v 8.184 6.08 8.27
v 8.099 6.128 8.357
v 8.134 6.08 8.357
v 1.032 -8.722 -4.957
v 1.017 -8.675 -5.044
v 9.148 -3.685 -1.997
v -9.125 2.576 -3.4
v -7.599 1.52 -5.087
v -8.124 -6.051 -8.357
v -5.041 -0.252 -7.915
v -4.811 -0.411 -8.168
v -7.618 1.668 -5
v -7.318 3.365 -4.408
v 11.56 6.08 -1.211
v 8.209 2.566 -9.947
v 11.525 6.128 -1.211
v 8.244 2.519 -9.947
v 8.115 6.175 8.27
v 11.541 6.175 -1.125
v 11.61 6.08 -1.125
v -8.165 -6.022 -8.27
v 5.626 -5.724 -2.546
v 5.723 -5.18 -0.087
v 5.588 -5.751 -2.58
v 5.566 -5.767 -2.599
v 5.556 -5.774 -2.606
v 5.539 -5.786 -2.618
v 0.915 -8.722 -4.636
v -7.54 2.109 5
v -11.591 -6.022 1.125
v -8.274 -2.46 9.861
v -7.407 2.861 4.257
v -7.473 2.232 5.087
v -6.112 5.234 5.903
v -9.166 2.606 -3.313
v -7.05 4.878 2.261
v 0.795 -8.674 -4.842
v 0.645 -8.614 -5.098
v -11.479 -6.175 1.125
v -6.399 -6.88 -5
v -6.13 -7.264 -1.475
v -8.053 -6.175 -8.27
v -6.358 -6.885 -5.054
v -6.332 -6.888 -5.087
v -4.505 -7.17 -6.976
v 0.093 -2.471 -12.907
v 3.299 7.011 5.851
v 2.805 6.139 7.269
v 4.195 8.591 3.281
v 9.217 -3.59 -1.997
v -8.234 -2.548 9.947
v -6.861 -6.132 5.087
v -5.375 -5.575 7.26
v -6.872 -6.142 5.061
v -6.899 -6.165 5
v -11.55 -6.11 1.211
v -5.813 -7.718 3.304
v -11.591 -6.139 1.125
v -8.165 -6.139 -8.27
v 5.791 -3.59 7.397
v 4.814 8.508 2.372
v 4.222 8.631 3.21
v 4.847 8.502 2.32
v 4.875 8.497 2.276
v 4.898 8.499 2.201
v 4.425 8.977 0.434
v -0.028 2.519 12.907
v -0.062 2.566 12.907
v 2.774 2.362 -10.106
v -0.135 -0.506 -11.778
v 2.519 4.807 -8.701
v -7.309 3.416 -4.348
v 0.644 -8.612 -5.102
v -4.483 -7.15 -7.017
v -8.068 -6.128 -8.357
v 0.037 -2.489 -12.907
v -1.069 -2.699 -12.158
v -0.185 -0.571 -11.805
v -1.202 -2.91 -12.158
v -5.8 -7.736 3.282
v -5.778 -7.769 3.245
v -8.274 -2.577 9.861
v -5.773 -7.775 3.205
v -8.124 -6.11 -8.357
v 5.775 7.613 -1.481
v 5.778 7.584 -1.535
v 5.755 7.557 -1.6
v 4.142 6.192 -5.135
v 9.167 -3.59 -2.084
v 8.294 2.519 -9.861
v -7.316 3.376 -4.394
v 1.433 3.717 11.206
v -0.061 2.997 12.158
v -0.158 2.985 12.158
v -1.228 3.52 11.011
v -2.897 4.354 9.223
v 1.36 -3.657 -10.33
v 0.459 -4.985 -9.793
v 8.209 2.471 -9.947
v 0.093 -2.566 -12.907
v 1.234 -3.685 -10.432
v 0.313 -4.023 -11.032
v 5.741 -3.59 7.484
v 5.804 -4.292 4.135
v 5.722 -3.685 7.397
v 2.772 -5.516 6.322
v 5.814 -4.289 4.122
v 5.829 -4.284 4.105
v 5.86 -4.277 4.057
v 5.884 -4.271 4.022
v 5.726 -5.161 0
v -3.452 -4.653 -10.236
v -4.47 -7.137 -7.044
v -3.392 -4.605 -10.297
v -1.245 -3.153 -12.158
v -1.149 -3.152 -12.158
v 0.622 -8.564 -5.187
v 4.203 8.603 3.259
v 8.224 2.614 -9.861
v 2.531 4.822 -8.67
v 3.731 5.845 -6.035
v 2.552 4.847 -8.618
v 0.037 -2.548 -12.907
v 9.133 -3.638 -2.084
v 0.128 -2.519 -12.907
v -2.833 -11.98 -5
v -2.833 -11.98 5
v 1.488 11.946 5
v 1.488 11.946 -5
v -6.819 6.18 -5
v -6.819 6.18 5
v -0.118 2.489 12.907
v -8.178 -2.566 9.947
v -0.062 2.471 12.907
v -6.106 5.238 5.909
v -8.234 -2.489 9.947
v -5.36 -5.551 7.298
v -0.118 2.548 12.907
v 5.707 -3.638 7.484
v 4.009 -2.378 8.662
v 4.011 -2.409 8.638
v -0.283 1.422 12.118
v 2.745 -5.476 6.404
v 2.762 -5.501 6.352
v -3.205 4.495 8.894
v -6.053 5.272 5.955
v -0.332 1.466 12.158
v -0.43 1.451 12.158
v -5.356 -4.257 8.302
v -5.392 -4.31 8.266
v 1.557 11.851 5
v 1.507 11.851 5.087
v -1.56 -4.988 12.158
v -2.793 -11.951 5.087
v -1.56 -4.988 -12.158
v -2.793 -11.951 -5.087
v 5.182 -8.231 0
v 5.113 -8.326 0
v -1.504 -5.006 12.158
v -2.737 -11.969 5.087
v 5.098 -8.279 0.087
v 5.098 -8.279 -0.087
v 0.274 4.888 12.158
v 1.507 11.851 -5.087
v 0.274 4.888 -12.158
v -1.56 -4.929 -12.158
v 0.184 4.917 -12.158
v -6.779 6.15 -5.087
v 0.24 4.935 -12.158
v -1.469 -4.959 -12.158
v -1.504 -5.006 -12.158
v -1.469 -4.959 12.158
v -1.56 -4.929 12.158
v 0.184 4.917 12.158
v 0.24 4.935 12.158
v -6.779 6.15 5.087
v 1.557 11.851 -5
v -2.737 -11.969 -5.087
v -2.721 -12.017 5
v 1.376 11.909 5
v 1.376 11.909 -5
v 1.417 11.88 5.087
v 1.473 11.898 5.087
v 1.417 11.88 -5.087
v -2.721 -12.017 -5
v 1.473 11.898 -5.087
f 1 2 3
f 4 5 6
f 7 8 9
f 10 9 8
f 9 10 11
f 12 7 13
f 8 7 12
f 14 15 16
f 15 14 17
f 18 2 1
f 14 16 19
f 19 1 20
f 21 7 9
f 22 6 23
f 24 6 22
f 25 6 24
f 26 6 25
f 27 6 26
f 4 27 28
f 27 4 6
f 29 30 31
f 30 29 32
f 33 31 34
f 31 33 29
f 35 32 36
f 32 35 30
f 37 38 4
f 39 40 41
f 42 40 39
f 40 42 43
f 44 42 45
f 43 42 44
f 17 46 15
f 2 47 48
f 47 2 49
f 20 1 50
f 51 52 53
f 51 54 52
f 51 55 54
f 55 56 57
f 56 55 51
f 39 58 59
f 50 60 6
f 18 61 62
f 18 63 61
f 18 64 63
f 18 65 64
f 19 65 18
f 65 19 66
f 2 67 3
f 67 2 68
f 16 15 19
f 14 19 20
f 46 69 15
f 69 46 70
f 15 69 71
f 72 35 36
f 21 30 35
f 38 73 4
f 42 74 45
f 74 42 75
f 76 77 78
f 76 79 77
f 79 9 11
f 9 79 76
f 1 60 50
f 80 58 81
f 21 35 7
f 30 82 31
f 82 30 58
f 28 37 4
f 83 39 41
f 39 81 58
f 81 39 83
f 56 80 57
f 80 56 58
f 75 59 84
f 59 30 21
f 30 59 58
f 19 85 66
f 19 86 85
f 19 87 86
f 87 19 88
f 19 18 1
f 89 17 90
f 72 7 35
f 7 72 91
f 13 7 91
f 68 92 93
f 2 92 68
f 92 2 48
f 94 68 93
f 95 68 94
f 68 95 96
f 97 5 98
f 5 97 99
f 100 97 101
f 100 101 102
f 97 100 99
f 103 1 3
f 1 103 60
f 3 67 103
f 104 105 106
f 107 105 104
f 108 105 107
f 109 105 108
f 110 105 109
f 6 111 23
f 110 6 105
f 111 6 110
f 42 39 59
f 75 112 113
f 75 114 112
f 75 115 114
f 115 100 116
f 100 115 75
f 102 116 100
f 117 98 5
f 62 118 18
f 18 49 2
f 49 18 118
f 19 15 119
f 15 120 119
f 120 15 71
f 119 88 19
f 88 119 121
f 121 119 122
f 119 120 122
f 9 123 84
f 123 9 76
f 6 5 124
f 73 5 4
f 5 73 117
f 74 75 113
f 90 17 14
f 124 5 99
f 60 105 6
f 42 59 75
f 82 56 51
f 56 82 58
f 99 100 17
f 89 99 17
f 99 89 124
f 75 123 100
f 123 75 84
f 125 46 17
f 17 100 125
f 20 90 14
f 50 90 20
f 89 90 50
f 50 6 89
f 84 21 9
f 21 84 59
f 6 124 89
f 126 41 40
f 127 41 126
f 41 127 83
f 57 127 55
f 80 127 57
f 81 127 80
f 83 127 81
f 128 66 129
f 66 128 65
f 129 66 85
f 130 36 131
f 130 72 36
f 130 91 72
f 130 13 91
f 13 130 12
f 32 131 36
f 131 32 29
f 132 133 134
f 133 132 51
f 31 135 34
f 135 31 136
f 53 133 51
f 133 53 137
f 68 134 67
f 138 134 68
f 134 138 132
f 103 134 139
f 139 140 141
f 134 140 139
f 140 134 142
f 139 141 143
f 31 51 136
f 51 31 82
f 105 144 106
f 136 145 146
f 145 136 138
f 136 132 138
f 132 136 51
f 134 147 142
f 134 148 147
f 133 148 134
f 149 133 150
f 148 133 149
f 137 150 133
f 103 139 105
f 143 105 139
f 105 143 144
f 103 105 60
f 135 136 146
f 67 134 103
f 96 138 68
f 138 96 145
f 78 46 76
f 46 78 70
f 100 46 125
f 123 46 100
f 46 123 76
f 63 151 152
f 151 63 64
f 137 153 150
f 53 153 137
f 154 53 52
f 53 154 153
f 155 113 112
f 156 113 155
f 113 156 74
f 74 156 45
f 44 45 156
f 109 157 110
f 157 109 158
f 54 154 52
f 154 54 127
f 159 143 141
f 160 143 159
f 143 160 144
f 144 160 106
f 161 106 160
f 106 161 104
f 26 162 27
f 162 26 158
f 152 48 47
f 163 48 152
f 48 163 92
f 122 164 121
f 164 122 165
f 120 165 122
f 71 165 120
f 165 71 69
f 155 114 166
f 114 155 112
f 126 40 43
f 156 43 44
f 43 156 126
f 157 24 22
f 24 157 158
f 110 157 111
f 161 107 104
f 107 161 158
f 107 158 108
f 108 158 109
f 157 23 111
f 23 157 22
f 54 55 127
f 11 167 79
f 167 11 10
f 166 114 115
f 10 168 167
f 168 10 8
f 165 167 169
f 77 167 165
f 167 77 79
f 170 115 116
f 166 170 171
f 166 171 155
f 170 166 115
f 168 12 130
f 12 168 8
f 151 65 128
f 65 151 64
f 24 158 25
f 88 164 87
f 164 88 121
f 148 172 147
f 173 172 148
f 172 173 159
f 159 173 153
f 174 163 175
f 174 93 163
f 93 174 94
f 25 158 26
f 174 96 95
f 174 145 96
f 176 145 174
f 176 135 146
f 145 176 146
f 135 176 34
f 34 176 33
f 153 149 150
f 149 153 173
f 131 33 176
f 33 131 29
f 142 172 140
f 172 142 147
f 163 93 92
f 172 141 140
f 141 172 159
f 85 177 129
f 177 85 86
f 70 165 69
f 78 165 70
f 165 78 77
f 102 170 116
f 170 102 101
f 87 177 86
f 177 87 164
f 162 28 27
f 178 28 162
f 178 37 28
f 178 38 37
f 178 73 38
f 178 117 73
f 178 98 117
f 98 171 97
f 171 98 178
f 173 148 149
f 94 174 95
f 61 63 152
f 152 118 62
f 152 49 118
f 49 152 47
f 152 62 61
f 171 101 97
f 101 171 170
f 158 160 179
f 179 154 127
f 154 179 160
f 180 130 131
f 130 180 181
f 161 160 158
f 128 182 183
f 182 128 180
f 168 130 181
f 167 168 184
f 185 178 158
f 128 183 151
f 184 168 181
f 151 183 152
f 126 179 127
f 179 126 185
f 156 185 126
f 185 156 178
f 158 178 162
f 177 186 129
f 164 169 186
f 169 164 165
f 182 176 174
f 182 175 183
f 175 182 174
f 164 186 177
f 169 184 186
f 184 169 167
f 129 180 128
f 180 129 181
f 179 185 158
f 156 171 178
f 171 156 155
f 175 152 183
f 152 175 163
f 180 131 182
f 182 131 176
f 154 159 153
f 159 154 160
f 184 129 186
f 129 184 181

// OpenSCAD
// Auto-generated OpenSCAD file

    inner_points = 10*[[-0.1519325222677969, -0.49588870782043115, 1.2071067811865481], [-0.2752191363280171, -1.1921648102349602, 0.5000000000000018], [0.14570769345513235, 1.185070501785053, -0.5000000000000018], [0.02242107939491221, 0.4887943993705236, -1.2071067811865481], [0.02242107939513263, 0.4887943993704884, 1.2071067811865466], [-0.2752191363281084, -1.1921648102349456, -0.499999999999998], [0.14570769345522366, 1.1850705017850383, 0.499999999999998], [-0.15193252226801734, -0.49588870782039596, -1.2071067811865466], [-0.848208624682401, -0.37260209376026526, 0.5000000000000662], [-0.6738550230195627, 0.612081013430669, -0.4999999999999354], [-0.6738550230194714, 0.6120810134306545, 0.5000000000000646], [-0.8482086246824923, -0.3726020937602507, -0.49999999999993383], [0.6315203809781617, -0.12683376828511966, 0.7071067811864822], [0.5082337669179414, -0.8231098706996488, -6.428191312579656e-14], [0.7548069950382528, 0.56944233412943, -6.644684802381562e-14], [0.6315203809780325, -0.1268337682850991, -0.7071067811866129]];

    outer_points = 10*[[-0.007761474101058263, 0.2518537970485801, 1.282035961125326], [-0.8193543823962504, -0.2518537970485801, 0.9860704042545944], [0.8193543823962504, 0.2518537970485801, -0.9860704042545944], [0.007761474101058263, -0.2518537970485801, -1.282035961125326], [0.8083780004585261, 0.608028852569843, 0.8270022394188679], [-1.1509806058735501, -0.608028852569843, 0.11247817802624172], [1.1509806058735501, 0.608028852569843, -0.11247817802624172], [-0.8083780004585261, -0.608028852569843, -0.8270022394188679], [-0.5768761153857935, 0.6108513156443435, 0.54228647196198], [-0.09236286430350876, 0.6108513156443435, -0.786339475972831], [0.23926335917379102, 0.9670263711656064, 0.08725275025552175], [-0.9085023388630934, 0.25467626012308053, -0.3313057542663727], [0.5691146412847352, -0.3589975185957634, 0.7397494891633462], [-0.24247826701045683, -0.8627051126929235, 0.44378393229261437], [0.9117172466997592, -0.3589975185957634, -0.19973092828176342], [0.10012433840456708, -0.8627051126929235, -0.4956964851524952]];

    // Convex hull for inner set (I)
    module inner_hull() {
        hull() {
            for (p = inner_points) {
                translate(p) sphere(r=0.1);
            }
        }
    }

    // Convex hull for outer set (O) minus inner hull (O \ I)
    module outer_minus_inner() {
        difference() {
            hull() {
                for (p = outer_points) {
                    translate(p) sphere(r=0.1);
                }
            }
            inner_hull(); // Subtract inner hull
        }
    }

    // Convex hull for outer set (O) minus all translated inner hulls
    module outer_minus_AllTranslationInner() {
        difference() {
            hull() {
                for (p = outer_points) {
                    translate(p) sphere(r=0.1);
                }
            }
            hull() {
                translate([0,0,50]) inner_hull();
                translate([0,0,-50]) inner_hull();
            }; // Subtract translated inner hulls
        }
    }

    // Difference between outer_minus_inner and outer_minus_AllTranslationInner
    module outer_minus_inner_diff() {
        difference() {
            // Outer minus inner
            difference() {
                hull() {
                    for (p = outer_points) {
                        translate(p) sphere(r=0.1);
                    }
                }
                inner_hull();
            }

            // Subtract Outer minus AllTranslationInner
            difference() {
                hull() {
                    for (p = outer_points) {
                        translate(p) sphere(r=0.1);
                    }
                }
                hull() {
                    translate([0,0,50]) inner_hull();
                    translate([0,0,-50]) inner_hull();
                };
            }
        }
    }

    // Rendering all with colors applied
    color([1, 0, 0, 0.5]) inner_hull(); // Transparent red
    color([0, 1, 0, 1]) outer_minus_AllTranslationInner(); // Opaque green
    color([1, 1, 0, 1]) outer_minus_inner_diff(); // Opaque yellow
    
